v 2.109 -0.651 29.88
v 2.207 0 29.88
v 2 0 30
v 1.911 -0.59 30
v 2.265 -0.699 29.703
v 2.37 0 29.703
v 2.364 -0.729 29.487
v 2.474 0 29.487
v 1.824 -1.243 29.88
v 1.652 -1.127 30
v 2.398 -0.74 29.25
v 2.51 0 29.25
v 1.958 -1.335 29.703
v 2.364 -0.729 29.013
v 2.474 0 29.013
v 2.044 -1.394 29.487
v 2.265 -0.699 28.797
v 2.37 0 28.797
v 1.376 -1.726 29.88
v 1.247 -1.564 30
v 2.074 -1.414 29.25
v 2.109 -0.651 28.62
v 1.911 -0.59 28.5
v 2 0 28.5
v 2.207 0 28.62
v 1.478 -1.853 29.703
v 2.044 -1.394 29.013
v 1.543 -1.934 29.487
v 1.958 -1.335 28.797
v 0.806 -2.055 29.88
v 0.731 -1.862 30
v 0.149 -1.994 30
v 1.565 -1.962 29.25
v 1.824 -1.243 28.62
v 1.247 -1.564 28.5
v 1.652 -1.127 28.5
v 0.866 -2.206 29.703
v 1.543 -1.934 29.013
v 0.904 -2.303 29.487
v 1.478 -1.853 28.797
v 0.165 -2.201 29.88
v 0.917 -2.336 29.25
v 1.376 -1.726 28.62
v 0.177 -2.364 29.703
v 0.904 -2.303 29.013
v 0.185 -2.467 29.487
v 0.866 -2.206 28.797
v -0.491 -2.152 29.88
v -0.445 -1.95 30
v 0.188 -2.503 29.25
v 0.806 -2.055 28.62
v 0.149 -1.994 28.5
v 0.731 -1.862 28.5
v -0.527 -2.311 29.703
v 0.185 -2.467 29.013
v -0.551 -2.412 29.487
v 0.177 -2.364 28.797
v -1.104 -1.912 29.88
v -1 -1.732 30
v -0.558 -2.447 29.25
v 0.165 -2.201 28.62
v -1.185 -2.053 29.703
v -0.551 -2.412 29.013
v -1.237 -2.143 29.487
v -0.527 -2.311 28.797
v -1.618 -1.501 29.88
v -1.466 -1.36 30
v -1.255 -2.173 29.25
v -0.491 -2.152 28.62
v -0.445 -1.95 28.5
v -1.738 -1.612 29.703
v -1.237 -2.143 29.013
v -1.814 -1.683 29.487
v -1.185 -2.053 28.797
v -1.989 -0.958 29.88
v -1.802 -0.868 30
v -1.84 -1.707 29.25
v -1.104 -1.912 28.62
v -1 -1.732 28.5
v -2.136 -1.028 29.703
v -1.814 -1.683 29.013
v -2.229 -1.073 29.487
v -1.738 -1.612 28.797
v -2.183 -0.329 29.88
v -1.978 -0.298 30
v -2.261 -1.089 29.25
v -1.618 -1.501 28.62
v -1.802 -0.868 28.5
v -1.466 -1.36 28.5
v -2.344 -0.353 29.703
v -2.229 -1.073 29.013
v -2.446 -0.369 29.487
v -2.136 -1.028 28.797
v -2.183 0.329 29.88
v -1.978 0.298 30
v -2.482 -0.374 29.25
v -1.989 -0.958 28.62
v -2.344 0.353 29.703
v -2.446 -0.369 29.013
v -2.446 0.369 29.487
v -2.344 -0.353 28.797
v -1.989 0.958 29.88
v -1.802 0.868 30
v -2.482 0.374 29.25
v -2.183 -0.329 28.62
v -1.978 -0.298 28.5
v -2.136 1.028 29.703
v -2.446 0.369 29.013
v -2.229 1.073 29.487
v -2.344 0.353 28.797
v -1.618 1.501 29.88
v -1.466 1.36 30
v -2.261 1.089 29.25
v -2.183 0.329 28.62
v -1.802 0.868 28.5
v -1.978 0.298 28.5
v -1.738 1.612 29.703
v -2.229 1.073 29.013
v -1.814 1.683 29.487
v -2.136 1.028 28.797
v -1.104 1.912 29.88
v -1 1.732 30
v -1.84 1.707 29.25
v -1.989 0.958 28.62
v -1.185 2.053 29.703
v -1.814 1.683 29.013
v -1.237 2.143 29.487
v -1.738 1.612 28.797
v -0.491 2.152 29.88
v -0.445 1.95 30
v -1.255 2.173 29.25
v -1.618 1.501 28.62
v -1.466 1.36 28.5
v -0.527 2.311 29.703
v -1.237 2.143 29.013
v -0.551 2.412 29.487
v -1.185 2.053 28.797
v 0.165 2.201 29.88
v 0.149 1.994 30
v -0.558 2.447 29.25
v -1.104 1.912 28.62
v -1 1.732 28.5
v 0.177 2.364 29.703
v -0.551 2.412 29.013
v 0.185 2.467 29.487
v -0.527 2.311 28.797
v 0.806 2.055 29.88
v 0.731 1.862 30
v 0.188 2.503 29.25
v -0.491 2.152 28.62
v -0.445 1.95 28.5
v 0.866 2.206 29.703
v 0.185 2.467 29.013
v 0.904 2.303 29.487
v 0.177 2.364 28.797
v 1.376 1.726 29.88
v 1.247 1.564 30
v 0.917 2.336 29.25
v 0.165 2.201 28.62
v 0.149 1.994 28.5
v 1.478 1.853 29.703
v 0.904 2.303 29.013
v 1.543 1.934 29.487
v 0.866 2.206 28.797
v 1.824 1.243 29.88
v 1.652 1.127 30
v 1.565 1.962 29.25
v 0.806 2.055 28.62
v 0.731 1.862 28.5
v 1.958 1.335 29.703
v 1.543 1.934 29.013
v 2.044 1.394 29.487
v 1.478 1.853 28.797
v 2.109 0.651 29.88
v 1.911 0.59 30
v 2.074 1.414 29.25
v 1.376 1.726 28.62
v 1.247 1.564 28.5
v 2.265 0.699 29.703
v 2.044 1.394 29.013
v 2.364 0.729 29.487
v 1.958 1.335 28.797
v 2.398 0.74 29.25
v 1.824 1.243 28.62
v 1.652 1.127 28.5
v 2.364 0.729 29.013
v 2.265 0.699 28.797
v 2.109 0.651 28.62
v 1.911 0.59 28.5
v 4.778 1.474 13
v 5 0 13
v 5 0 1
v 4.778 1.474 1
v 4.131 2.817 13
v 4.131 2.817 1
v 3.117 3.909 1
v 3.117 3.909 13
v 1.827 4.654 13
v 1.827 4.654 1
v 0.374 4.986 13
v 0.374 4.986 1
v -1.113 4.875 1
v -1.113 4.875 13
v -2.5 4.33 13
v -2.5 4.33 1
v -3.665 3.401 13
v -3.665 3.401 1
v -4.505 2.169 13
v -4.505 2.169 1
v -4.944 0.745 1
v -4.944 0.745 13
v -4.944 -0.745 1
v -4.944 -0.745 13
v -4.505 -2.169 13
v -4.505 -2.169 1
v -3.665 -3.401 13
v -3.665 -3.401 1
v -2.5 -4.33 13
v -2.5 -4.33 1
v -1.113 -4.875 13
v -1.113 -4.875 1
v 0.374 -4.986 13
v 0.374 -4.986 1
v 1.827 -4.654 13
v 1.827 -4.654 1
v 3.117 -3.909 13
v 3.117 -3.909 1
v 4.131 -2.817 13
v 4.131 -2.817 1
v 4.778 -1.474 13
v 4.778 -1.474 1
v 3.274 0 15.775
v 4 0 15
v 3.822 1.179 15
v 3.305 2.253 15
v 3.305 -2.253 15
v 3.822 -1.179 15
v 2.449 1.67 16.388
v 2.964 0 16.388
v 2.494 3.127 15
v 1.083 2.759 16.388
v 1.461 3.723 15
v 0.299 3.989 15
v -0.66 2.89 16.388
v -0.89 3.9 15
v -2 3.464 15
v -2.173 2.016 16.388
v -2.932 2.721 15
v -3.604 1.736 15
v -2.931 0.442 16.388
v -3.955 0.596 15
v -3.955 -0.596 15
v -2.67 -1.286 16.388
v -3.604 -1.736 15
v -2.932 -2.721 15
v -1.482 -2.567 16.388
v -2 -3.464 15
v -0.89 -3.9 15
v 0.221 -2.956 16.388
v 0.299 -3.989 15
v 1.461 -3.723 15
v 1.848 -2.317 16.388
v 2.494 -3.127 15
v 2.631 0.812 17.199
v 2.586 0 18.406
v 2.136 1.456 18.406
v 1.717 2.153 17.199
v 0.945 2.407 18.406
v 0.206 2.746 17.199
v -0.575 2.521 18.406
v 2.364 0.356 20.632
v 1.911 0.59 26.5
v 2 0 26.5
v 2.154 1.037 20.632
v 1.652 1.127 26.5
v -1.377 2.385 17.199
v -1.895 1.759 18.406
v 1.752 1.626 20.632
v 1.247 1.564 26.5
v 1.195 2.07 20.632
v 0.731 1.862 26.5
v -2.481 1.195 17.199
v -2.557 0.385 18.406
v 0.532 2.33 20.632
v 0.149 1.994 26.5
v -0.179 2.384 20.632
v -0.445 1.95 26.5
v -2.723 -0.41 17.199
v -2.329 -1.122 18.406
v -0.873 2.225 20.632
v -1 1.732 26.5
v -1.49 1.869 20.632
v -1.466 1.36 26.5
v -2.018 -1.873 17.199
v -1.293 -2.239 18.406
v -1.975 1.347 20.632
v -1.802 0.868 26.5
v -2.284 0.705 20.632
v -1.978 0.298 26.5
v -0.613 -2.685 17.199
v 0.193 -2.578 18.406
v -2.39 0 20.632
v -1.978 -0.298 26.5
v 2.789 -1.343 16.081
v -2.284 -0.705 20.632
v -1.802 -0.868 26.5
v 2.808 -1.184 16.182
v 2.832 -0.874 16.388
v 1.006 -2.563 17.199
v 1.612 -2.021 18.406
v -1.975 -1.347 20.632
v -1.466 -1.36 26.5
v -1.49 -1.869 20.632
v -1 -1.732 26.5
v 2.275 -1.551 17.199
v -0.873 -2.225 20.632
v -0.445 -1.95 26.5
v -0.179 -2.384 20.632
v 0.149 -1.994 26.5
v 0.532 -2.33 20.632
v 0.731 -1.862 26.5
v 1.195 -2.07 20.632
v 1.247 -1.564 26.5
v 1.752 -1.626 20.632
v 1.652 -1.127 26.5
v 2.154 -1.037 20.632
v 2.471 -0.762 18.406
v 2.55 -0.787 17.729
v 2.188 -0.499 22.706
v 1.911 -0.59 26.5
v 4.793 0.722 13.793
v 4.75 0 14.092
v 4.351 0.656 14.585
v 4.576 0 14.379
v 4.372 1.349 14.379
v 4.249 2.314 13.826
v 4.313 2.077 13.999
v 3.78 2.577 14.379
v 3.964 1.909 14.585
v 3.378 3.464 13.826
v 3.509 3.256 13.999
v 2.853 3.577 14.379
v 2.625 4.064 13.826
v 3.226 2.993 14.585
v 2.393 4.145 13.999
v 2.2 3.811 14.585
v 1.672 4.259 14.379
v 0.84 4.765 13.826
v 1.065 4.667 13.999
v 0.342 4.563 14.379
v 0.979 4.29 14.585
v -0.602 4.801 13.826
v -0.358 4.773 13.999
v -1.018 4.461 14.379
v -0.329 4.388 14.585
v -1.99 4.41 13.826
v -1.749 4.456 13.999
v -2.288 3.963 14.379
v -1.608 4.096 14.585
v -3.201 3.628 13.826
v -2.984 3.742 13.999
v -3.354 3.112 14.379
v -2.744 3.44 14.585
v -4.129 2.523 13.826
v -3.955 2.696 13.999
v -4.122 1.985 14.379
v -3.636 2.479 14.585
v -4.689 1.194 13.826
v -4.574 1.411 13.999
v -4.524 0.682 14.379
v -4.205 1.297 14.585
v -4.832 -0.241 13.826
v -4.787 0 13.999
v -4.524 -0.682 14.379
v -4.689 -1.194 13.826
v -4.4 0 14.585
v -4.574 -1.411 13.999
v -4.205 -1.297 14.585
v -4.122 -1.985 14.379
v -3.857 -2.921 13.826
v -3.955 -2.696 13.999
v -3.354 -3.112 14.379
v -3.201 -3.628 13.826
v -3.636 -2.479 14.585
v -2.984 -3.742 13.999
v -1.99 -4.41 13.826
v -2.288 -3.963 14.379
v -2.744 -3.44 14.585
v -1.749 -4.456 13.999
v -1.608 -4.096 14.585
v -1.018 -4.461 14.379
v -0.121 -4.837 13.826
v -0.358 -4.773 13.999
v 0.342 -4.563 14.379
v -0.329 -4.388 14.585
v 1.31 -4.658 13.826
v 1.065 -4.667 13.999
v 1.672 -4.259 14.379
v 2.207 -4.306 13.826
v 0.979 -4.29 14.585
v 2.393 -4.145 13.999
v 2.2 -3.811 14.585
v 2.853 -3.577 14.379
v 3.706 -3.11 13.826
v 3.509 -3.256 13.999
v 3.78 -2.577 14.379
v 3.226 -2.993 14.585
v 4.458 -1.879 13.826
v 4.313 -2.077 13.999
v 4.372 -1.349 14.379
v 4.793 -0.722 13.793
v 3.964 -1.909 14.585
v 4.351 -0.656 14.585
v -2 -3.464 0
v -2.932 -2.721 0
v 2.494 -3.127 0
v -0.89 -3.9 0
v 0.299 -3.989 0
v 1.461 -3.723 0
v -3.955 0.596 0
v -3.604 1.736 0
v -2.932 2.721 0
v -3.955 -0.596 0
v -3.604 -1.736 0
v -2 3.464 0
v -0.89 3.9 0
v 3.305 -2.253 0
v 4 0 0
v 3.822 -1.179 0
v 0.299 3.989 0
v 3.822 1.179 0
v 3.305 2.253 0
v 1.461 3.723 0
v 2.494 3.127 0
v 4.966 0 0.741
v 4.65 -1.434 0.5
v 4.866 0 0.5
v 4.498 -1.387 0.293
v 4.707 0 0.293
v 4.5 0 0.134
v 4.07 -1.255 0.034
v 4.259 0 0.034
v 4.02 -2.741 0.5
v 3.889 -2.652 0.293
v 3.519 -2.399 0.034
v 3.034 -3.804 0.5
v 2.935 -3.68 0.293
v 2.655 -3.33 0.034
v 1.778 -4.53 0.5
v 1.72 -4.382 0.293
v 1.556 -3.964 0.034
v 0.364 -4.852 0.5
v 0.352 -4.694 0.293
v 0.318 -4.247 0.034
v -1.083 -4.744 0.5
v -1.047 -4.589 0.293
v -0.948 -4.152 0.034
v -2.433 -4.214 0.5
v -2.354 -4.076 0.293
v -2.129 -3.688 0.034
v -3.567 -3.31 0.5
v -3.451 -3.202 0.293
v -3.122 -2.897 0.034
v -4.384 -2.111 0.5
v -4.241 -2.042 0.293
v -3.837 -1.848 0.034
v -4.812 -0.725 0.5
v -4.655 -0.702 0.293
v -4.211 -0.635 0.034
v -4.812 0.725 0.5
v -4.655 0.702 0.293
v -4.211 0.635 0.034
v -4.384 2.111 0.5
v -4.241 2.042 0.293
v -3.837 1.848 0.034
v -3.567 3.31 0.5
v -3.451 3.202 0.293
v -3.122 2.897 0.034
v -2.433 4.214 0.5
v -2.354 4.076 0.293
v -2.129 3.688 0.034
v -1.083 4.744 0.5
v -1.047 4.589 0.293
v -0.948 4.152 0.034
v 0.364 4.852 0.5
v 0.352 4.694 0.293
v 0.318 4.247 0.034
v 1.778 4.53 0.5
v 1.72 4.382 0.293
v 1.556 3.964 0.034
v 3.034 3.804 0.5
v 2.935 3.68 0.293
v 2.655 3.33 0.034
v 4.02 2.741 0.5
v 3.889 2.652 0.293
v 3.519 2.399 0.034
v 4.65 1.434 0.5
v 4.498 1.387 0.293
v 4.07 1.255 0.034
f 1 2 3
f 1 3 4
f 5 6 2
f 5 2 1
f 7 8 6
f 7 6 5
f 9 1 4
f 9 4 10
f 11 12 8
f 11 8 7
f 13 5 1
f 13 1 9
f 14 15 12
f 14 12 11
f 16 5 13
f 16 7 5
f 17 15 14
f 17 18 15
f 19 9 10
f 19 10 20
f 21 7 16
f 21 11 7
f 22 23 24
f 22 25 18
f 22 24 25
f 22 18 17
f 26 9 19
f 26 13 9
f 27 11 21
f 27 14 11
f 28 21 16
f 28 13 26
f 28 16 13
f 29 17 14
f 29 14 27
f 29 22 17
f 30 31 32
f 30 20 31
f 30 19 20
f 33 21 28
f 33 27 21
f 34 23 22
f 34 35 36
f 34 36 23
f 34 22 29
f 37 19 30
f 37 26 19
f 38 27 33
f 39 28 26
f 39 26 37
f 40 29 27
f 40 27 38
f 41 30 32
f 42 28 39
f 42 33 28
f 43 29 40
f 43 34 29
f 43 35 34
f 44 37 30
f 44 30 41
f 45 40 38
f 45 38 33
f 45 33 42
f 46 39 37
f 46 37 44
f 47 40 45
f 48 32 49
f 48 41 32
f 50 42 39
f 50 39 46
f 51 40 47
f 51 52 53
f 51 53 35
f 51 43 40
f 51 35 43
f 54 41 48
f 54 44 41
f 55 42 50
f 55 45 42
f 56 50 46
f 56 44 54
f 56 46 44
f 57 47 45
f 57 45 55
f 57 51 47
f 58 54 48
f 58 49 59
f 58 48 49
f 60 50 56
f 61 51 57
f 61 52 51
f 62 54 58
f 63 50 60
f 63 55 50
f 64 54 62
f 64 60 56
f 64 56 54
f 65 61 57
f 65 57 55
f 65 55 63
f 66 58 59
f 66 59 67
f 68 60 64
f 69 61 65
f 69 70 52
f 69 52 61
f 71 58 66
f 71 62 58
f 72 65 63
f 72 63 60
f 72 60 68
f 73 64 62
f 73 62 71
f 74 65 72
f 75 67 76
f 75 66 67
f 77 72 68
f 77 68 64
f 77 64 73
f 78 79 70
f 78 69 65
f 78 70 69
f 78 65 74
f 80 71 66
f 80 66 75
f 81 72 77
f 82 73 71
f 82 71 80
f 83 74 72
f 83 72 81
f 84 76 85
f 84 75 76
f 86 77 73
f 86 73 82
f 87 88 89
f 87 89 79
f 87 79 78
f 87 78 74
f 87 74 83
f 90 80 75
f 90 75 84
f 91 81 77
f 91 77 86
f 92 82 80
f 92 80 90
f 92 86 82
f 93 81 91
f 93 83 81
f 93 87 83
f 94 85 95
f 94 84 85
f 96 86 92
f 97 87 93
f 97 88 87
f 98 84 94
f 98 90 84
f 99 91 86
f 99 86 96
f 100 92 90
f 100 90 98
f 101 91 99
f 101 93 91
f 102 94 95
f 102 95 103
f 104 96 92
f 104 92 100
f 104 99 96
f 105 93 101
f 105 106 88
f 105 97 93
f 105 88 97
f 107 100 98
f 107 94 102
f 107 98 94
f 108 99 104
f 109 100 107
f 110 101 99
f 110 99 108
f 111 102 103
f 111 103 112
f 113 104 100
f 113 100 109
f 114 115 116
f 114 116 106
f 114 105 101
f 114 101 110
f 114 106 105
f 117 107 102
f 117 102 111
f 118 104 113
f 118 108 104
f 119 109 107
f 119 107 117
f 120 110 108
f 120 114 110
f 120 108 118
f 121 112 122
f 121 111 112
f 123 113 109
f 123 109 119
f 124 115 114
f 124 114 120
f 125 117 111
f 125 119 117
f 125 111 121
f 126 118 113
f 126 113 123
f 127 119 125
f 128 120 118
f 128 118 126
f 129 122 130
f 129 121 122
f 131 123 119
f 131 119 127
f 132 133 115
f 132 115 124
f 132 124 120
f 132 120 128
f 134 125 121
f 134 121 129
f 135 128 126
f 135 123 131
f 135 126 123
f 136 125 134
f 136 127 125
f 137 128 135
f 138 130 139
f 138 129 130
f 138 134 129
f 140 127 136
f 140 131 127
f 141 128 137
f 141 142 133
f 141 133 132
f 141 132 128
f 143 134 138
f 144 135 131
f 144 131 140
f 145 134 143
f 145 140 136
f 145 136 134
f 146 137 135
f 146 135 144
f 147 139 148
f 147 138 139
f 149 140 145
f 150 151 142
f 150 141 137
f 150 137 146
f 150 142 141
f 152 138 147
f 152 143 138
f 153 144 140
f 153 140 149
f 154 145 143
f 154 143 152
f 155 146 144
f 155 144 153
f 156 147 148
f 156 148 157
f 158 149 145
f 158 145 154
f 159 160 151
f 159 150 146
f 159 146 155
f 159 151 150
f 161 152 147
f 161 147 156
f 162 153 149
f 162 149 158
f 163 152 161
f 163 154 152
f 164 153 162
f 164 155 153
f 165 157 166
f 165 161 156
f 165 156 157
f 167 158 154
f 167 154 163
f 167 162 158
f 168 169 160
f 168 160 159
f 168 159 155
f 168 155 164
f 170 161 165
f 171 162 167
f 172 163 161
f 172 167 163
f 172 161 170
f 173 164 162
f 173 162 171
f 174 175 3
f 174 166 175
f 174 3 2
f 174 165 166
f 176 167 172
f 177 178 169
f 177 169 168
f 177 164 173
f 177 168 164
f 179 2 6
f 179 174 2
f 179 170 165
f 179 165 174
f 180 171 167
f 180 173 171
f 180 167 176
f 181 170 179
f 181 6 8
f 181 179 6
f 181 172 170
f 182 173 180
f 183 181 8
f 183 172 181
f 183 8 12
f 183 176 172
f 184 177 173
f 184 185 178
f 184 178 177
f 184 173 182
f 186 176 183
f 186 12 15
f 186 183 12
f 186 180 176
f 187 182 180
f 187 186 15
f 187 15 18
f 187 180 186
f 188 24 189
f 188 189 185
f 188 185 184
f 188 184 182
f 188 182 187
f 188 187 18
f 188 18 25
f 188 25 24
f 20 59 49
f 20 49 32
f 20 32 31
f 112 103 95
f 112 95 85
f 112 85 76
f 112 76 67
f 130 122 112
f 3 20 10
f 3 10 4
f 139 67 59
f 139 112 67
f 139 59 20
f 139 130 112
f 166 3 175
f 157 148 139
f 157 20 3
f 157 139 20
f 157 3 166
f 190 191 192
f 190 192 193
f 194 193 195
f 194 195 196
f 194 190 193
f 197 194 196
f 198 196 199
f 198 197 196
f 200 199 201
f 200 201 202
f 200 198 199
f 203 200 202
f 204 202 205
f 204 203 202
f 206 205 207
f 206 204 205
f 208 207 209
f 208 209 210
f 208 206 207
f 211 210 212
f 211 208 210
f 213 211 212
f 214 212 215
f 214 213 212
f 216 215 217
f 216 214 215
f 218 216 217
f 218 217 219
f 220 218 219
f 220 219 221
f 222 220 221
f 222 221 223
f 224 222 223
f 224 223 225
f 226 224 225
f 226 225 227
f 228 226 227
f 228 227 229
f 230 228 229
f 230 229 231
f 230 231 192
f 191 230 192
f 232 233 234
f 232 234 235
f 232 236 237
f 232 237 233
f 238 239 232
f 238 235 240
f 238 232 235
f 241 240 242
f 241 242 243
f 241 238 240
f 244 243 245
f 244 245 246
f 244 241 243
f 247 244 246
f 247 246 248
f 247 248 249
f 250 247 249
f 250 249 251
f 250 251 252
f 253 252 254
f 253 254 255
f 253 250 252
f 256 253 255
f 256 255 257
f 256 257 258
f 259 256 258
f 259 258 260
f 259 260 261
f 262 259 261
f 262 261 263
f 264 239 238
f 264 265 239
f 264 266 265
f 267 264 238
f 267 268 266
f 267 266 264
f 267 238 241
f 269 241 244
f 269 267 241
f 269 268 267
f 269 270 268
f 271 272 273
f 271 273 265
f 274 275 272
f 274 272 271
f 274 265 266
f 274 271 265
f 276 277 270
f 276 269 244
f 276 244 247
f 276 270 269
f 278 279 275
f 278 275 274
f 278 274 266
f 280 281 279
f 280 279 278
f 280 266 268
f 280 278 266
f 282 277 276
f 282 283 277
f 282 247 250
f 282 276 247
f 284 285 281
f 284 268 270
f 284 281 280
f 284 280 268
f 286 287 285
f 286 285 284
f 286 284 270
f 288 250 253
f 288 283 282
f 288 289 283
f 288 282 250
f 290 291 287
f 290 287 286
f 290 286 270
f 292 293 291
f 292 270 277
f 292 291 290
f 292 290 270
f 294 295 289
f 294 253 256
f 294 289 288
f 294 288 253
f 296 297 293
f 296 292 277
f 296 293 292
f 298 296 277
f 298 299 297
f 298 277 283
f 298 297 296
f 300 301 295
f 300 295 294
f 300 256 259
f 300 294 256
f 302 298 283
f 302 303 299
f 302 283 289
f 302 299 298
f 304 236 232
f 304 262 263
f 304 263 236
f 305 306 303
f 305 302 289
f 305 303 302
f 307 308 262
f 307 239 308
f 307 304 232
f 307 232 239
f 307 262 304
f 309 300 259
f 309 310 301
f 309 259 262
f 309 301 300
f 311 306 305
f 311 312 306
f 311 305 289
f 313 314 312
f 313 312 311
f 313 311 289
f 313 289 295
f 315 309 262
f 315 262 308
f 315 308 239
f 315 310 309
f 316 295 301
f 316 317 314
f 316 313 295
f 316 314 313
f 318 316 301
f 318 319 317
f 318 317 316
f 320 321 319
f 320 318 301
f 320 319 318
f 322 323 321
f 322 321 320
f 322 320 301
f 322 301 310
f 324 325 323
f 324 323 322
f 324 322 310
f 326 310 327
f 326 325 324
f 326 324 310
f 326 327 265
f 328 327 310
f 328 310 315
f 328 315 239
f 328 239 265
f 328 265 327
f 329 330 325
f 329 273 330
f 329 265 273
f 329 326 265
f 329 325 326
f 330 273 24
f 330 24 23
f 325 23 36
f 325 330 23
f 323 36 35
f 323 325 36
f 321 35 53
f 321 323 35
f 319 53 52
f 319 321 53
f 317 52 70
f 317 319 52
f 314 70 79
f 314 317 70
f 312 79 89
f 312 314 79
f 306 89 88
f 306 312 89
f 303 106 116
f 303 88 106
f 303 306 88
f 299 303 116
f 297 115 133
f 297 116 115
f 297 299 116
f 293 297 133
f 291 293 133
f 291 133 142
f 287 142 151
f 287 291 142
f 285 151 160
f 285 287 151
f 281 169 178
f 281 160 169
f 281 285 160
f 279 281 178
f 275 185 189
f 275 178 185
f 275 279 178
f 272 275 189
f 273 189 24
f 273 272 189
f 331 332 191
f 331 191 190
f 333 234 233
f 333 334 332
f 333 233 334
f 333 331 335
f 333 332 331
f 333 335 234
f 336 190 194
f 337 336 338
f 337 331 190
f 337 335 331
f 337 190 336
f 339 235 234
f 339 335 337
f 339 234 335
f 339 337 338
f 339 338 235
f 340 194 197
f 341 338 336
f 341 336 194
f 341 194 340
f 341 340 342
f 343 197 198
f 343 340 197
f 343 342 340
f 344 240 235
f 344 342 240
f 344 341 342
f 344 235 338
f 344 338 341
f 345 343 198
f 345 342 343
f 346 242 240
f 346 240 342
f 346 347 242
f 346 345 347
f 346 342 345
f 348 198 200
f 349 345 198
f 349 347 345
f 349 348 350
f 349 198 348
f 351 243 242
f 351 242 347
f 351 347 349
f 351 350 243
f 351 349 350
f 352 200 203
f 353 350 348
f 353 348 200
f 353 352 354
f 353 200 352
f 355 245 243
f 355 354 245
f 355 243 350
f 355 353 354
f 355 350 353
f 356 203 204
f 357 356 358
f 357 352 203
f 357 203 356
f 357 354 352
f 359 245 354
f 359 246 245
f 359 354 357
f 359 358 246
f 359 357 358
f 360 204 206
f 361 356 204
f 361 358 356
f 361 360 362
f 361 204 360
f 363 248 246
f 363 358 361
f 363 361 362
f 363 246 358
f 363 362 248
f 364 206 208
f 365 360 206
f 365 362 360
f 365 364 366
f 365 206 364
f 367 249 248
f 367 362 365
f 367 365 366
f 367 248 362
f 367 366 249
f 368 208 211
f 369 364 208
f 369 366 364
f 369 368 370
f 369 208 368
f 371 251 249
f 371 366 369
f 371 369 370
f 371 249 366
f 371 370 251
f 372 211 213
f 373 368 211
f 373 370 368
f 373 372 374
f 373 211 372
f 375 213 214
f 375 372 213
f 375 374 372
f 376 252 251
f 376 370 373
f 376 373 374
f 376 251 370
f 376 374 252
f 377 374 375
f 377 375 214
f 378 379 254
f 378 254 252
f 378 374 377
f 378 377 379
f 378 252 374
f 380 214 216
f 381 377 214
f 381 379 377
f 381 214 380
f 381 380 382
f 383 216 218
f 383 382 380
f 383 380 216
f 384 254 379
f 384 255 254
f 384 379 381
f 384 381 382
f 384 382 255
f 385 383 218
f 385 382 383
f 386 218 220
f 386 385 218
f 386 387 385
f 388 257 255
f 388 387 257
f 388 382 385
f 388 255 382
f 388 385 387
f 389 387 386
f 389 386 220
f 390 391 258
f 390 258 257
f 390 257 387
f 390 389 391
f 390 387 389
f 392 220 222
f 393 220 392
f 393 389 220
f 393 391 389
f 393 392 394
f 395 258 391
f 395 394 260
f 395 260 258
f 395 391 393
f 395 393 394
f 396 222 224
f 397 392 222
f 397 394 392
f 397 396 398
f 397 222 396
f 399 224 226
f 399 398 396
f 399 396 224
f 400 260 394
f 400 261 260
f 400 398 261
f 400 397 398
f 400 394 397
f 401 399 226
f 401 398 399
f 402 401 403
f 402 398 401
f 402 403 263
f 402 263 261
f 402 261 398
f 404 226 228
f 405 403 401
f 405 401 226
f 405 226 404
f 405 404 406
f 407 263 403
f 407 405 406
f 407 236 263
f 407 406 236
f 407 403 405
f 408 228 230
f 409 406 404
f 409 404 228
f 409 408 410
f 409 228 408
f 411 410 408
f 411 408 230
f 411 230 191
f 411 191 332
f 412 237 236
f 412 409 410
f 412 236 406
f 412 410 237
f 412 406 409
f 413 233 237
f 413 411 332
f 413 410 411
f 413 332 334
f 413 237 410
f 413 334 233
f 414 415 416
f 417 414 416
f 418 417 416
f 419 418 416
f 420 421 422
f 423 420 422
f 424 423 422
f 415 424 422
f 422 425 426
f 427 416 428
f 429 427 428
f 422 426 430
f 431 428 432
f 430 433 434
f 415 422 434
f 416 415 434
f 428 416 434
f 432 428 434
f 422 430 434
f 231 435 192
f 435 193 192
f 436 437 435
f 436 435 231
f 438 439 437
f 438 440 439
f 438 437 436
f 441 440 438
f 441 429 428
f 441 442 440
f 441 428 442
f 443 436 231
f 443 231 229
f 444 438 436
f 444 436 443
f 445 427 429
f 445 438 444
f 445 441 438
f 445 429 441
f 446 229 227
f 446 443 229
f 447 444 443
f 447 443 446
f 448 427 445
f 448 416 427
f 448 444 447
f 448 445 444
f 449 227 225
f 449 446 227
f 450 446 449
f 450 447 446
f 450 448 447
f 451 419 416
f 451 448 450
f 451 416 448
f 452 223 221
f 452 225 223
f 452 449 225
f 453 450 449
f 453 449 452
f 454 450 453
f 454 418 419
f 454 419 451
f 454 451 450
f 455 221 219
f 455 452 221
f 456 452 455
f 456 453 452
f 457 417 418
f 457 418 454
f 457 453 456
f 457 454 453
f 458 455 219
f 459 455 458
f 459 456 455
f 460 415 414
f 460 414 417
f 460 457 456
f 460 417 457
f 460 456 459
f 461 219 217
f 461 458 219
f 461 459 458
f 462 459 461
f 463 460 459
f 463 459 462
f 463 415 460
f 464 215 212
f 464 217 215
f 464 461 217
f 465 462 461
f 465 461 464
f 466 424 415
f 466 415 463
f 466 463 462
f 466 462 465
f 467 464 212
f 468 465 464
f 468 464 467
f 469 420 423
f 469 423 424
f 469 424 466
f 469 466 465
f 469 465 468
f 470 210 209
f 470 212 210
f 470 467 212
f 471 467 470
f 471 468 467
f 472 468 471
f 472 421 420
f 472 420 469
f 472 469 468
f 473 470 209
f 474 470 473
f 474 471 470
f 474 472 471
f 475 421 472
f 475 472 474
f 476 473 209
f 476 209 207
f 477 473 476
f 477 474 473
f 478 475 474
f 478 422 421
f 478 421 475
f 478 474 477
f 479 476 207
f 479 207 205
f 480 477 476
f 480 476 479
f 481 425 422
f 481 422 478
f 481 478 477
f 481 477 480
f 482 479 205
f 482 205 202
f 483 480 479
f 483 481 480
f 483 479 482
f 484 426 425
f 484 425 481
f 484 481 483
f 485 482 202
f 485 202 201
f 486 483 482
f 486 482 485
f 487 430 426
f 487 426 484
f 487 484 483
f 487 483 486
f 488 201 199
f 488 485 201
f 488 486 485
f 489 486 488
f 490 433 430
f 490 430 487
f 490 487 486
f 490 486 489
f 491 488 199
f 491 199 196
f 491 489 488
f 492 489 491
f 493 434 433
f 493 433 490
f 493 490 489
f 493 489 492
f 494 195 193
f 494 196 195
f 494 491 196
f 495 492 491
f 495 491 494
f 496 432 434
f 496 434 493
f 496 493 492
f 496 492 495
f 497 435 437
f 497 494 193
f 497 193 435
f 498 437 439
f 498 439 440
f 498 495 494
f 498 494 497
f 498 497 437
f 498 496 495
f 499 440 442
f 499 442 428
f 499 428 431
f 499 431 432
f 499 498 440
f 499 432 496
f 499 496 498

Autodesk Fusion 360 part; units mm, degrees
sketch "Sketch1" plane through (0, 0, 0) normal (0, 1, 0) x (1, 0, 0)
  line L0 (0, 0) -> (4, 0)
  arc A0 (5, -1) -> (4, 0) centre (4, -1) ccw
  line L1 (5, -1) -> (5, -13)
  line L2 (0, 0) -> (0, -30)
  line L3 (0, -30) -> (2, -30)
  spline S0 degree 2 poles (5, -13) (4.7977, -14.1987) (4, -15) knots 0 0 0 0.22987 0.22987 0.22987 weights 1 3 1
  arc A1 (2, -30) -> (2, -28.5) centre (1.7031, -29.25) ccw
  line L4 (2, -28.5) -> (2, -26.5)
  spline S1 degree 2 poles (4, -15) (2.6442, -16.1662) (2, -26.5) knots 0 0 0 1.18535 1.18535 1.18535 weights 1 3 1
  dimension "d1" = 4
  dimension "d2" = 12
  dimension "d3" = 30
  dimension "d9" = 2
  dimension "d11" = 2
revolve "Revolve1" add sketch "Sketch1" angle 360 about axis through (0, 0, 0) along (0, 0, 1)
